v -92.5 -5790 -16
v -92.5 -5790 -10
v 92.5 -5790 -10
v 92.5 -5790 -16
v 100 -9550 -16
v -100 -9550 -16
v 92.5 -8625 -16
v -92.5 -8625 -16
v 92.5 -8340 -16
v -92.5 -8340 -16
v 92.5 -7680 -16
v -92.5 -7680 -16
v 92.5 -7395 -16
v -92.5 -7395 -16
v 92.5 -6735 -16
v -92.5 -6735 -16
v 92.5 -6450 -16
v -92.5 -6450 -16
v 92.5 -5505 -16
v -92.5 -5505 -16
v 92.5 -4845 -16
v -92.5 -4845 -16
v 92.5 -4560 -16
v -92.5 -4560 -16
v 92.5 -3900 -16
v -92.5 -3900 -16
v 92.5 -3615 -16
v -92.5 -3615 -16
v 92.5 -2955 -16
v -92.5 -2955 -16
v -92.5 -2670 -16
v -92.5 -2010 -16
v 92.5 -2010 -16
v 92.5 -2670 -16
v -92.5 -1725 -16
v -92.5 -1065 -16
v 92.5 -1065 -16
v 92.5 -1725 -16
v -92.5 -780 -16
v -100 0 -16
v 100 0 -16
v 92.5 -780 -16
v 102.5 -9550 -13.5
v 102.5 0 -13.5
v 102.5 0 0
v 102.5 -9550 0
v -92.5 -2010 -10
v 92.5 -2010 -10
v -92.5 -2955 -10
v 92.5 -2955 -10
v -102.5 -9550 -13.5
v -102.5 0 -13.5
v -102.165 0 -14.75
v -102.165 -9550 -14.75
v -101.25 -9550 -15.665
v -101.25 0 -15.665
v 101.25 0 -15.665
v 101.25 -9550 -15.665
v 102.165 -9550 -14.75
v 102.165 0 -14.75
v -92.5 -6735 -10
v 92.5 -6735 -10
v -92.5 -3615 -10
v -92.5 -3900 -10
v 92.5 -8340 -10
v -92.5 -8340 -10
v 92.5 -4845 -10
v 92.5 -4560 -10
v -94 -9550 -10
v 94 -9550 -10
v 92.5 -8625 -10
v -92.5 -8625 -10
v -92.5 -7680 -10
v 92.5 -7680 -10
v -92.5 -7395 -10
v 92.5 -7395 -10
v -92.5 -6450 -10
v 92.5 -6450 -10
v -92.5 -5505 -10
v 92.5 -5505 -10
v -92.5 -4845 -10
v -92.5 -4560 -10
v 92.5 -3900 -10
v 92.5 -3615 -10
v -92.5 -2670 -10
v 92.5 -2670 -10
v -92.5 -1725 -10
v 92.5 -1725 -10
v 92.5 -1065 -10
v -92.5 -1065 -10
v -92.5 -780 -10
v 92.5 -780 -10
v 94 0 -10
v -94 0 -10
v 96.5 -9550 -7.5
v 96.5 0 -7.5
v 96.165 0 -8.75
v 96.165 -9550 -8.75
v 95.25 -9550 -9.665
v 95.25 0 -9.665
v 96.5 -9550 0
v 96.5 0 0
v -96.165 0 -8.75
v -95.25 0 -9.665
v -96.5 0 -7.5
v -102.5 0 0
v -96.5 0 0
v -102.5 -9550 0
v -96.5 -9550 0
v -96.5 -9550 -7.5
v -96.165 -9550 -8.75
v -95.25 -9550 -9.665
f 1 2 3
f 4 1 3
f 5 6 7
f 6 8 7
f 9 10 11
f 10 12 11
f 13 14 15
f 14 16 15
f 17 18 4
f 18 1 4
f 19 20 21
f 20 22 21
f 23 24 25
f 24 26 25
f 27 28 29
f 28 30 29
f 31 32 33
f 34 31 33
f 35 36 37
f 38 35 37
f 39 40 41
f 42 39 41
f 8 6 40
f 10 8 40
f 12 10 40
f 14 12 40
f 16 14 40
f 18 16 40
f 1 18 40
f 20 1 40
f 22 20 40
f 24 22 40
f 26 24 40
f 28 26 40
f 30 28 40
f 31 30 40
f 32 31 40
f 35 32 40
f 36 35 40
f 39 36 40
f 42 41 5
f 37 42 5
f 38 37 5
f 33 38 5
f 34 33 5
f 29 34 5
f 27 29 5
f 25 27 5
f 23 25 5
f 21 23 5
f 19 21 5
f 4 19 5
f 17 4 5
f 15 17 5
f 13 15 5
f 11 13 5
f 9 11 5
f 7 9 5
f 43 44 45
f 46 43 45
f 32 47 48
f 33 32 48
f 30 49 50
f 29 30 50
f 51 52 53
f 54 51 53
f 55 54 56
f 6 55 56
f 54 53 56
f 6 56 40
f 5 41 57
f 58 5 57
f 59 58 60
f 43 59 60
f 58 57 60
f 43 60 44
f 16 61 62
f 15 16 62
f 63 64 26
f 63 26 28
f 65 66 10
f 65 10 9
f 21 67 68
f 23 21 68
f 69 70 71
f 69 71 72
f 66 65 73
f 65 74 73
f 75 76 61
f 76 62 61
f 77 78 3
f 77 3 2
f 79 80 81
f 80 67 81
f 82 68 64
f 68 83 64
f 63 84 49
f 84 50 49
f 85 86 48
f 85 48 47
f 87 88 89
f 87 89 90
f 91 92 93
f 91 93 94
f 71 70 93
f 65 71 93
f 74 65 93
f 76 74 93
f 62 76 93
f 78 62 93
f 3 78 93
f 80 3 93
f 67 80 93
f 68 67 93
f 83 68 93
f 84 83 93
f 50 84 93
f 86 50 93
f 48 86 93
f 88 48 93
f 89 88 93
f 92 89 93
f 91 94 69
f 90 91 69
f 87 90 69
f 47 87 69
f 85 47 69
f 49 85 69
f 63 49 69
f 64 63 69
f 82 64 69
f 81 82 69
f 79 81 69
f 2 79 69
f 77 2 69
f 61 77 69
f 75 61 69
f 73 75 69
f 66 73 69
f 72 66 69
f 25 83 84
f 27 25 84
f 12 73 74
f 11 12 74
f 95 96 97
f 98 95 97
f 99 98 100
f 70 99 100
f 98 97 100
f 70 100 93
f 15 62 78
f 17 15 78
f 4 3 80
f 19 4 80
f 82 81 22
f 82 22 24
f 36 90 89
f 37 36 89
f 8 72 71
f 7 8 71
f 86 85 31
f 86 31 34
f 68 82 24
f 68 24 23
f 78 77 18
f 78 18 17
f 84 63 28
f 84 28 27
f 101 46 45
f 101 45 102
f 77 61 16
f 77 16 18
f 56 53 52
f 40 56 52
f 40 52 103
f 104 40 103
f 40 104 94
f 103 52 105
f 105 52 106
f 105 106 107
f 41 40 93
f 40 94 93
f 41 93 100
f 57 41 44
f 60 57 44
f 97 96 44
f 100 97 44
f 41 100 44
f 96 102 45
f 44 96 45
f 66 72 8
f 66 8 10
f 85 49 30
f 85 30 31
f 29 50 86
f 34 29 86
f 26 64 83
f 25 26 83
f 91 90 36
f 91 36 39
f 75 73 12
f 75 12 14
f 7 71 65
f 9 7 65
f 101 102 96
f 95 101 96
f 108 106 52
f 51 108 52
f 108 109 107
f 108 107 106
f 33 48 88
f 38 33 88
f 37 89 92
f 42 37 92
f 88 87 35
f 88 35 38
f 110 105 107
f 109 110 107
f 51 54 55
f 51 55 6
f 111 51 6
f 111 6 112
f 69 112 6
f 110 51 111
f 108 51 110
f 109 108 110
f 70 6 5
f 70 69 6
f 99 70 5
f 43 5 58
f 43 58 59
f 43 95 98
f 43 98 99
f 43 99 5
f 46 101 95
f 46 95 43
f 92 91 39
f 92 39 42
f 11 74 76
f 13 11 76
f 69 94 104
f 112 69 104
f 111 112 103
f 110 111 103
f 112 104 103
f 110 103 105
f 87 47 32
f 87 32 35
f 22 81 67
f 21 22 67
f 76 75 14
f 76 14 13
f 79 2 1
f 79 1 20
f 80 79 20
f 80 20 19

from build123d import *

# Parameters (mm, degrees)
F1_DEPTH = 9550
F2_W     = 185
F2_H     = 285
F3_DEPTH = 25


with BuildPart() as f1:
    # F0 (on Front) → F1 (new body)
    with BuildSketch(Plane.XZ):
        with BuildLine():
            Line((-100, -16), (100, -16))
            ThreePointArc((100, -16), (101.767767, -15.267767), (102.5, -13.5))
            Line((102.5, -13.5), (102.5, 0))
            Line((102.5, 0), (99.5, 0))
            Line((99.5, 0), (99.5, -10.5))
            ThreePointArc((99.5, -10.5), (98.767767, -12.267767), (97, -13))
            Line((97, -13), (-97, -13))
            ThreePointArc((-97, -13), (-98.767767, -12.267767), (-99.5, -10.5))
            Line((-99.5, -10.5), (-99.5, 0))
            Line((-99.5, 0), (-102.5, 0))
            Line((-102.5, 0), (-102.5, -13.5))
            ThreePointArc((-102.5, -13.5), (-101.767767, -15.267767), (-100, -16))
        make_face()
        with BuildLine():
            Line((99.5, -10.5), (99.5, 0))
            Line((99.5, 0), (96.5, 0))
            Line((96.5, 0), (96.5, -7.5))
            ThreePointArc((96.5, -7.5), (95.767767, -9.267767), (94, -10))
            Line((94, -10), (-94, -10))
            ThreePointArc((-94, -10), (-95.767767, -9.267767), (-96.5, -7.5))
            Line((-96.5, -7.5), (-96.5, 0))
            Line((-96.5, 0), (-99.5, 0))
            Line((-99.5, 0), (-99.5, -10.5))
            ThreePointArc((-99.5, -10.5), (-98.767767, -12.267767), (-97, -13))
            Line((-97, -13), (97, -13))
            ThreePointArc((97, -13), (98.767767, -12.267767), (99.5, -10.5))
        make_face()
    extrude(amount=F1_DEPTH)

    # F2 (on face) → F3 (cut)
    with BuildSketch(Plane.XY.offset(-10)):
        with Locations((0, -8482.5)):
            Rectangle(F2_W, F2_H)
        with Locations((0, -7537.5)):
            Rectangle(F2_W, F2_H)
        with Locations((0, -6592.5)):
            Rectangle(F2_W, F2_H)
        with Locations((0, -5647.5)):
            Rectangle(F2_W, F2_H)
        with Locations((0, -4702.5)):
            Rectangle(F2_W, F2_H)
        with Locations((0, -3757.5)):
            Rectangle(F2_W, F2_H)
        with Locations((0, -2812.5)):
            Rectangle(F2_W, F2_H)
        with Locations((0, -1867.5)):
            Rectangle(F2_W, F2_H)
        with Locations((0, -922.5)):
            Rectangle(F2_W, F2_H)
    extrude(amount=-F3_DEPTH, mode=Mode.SUBTRACT)


solid = f1.part
